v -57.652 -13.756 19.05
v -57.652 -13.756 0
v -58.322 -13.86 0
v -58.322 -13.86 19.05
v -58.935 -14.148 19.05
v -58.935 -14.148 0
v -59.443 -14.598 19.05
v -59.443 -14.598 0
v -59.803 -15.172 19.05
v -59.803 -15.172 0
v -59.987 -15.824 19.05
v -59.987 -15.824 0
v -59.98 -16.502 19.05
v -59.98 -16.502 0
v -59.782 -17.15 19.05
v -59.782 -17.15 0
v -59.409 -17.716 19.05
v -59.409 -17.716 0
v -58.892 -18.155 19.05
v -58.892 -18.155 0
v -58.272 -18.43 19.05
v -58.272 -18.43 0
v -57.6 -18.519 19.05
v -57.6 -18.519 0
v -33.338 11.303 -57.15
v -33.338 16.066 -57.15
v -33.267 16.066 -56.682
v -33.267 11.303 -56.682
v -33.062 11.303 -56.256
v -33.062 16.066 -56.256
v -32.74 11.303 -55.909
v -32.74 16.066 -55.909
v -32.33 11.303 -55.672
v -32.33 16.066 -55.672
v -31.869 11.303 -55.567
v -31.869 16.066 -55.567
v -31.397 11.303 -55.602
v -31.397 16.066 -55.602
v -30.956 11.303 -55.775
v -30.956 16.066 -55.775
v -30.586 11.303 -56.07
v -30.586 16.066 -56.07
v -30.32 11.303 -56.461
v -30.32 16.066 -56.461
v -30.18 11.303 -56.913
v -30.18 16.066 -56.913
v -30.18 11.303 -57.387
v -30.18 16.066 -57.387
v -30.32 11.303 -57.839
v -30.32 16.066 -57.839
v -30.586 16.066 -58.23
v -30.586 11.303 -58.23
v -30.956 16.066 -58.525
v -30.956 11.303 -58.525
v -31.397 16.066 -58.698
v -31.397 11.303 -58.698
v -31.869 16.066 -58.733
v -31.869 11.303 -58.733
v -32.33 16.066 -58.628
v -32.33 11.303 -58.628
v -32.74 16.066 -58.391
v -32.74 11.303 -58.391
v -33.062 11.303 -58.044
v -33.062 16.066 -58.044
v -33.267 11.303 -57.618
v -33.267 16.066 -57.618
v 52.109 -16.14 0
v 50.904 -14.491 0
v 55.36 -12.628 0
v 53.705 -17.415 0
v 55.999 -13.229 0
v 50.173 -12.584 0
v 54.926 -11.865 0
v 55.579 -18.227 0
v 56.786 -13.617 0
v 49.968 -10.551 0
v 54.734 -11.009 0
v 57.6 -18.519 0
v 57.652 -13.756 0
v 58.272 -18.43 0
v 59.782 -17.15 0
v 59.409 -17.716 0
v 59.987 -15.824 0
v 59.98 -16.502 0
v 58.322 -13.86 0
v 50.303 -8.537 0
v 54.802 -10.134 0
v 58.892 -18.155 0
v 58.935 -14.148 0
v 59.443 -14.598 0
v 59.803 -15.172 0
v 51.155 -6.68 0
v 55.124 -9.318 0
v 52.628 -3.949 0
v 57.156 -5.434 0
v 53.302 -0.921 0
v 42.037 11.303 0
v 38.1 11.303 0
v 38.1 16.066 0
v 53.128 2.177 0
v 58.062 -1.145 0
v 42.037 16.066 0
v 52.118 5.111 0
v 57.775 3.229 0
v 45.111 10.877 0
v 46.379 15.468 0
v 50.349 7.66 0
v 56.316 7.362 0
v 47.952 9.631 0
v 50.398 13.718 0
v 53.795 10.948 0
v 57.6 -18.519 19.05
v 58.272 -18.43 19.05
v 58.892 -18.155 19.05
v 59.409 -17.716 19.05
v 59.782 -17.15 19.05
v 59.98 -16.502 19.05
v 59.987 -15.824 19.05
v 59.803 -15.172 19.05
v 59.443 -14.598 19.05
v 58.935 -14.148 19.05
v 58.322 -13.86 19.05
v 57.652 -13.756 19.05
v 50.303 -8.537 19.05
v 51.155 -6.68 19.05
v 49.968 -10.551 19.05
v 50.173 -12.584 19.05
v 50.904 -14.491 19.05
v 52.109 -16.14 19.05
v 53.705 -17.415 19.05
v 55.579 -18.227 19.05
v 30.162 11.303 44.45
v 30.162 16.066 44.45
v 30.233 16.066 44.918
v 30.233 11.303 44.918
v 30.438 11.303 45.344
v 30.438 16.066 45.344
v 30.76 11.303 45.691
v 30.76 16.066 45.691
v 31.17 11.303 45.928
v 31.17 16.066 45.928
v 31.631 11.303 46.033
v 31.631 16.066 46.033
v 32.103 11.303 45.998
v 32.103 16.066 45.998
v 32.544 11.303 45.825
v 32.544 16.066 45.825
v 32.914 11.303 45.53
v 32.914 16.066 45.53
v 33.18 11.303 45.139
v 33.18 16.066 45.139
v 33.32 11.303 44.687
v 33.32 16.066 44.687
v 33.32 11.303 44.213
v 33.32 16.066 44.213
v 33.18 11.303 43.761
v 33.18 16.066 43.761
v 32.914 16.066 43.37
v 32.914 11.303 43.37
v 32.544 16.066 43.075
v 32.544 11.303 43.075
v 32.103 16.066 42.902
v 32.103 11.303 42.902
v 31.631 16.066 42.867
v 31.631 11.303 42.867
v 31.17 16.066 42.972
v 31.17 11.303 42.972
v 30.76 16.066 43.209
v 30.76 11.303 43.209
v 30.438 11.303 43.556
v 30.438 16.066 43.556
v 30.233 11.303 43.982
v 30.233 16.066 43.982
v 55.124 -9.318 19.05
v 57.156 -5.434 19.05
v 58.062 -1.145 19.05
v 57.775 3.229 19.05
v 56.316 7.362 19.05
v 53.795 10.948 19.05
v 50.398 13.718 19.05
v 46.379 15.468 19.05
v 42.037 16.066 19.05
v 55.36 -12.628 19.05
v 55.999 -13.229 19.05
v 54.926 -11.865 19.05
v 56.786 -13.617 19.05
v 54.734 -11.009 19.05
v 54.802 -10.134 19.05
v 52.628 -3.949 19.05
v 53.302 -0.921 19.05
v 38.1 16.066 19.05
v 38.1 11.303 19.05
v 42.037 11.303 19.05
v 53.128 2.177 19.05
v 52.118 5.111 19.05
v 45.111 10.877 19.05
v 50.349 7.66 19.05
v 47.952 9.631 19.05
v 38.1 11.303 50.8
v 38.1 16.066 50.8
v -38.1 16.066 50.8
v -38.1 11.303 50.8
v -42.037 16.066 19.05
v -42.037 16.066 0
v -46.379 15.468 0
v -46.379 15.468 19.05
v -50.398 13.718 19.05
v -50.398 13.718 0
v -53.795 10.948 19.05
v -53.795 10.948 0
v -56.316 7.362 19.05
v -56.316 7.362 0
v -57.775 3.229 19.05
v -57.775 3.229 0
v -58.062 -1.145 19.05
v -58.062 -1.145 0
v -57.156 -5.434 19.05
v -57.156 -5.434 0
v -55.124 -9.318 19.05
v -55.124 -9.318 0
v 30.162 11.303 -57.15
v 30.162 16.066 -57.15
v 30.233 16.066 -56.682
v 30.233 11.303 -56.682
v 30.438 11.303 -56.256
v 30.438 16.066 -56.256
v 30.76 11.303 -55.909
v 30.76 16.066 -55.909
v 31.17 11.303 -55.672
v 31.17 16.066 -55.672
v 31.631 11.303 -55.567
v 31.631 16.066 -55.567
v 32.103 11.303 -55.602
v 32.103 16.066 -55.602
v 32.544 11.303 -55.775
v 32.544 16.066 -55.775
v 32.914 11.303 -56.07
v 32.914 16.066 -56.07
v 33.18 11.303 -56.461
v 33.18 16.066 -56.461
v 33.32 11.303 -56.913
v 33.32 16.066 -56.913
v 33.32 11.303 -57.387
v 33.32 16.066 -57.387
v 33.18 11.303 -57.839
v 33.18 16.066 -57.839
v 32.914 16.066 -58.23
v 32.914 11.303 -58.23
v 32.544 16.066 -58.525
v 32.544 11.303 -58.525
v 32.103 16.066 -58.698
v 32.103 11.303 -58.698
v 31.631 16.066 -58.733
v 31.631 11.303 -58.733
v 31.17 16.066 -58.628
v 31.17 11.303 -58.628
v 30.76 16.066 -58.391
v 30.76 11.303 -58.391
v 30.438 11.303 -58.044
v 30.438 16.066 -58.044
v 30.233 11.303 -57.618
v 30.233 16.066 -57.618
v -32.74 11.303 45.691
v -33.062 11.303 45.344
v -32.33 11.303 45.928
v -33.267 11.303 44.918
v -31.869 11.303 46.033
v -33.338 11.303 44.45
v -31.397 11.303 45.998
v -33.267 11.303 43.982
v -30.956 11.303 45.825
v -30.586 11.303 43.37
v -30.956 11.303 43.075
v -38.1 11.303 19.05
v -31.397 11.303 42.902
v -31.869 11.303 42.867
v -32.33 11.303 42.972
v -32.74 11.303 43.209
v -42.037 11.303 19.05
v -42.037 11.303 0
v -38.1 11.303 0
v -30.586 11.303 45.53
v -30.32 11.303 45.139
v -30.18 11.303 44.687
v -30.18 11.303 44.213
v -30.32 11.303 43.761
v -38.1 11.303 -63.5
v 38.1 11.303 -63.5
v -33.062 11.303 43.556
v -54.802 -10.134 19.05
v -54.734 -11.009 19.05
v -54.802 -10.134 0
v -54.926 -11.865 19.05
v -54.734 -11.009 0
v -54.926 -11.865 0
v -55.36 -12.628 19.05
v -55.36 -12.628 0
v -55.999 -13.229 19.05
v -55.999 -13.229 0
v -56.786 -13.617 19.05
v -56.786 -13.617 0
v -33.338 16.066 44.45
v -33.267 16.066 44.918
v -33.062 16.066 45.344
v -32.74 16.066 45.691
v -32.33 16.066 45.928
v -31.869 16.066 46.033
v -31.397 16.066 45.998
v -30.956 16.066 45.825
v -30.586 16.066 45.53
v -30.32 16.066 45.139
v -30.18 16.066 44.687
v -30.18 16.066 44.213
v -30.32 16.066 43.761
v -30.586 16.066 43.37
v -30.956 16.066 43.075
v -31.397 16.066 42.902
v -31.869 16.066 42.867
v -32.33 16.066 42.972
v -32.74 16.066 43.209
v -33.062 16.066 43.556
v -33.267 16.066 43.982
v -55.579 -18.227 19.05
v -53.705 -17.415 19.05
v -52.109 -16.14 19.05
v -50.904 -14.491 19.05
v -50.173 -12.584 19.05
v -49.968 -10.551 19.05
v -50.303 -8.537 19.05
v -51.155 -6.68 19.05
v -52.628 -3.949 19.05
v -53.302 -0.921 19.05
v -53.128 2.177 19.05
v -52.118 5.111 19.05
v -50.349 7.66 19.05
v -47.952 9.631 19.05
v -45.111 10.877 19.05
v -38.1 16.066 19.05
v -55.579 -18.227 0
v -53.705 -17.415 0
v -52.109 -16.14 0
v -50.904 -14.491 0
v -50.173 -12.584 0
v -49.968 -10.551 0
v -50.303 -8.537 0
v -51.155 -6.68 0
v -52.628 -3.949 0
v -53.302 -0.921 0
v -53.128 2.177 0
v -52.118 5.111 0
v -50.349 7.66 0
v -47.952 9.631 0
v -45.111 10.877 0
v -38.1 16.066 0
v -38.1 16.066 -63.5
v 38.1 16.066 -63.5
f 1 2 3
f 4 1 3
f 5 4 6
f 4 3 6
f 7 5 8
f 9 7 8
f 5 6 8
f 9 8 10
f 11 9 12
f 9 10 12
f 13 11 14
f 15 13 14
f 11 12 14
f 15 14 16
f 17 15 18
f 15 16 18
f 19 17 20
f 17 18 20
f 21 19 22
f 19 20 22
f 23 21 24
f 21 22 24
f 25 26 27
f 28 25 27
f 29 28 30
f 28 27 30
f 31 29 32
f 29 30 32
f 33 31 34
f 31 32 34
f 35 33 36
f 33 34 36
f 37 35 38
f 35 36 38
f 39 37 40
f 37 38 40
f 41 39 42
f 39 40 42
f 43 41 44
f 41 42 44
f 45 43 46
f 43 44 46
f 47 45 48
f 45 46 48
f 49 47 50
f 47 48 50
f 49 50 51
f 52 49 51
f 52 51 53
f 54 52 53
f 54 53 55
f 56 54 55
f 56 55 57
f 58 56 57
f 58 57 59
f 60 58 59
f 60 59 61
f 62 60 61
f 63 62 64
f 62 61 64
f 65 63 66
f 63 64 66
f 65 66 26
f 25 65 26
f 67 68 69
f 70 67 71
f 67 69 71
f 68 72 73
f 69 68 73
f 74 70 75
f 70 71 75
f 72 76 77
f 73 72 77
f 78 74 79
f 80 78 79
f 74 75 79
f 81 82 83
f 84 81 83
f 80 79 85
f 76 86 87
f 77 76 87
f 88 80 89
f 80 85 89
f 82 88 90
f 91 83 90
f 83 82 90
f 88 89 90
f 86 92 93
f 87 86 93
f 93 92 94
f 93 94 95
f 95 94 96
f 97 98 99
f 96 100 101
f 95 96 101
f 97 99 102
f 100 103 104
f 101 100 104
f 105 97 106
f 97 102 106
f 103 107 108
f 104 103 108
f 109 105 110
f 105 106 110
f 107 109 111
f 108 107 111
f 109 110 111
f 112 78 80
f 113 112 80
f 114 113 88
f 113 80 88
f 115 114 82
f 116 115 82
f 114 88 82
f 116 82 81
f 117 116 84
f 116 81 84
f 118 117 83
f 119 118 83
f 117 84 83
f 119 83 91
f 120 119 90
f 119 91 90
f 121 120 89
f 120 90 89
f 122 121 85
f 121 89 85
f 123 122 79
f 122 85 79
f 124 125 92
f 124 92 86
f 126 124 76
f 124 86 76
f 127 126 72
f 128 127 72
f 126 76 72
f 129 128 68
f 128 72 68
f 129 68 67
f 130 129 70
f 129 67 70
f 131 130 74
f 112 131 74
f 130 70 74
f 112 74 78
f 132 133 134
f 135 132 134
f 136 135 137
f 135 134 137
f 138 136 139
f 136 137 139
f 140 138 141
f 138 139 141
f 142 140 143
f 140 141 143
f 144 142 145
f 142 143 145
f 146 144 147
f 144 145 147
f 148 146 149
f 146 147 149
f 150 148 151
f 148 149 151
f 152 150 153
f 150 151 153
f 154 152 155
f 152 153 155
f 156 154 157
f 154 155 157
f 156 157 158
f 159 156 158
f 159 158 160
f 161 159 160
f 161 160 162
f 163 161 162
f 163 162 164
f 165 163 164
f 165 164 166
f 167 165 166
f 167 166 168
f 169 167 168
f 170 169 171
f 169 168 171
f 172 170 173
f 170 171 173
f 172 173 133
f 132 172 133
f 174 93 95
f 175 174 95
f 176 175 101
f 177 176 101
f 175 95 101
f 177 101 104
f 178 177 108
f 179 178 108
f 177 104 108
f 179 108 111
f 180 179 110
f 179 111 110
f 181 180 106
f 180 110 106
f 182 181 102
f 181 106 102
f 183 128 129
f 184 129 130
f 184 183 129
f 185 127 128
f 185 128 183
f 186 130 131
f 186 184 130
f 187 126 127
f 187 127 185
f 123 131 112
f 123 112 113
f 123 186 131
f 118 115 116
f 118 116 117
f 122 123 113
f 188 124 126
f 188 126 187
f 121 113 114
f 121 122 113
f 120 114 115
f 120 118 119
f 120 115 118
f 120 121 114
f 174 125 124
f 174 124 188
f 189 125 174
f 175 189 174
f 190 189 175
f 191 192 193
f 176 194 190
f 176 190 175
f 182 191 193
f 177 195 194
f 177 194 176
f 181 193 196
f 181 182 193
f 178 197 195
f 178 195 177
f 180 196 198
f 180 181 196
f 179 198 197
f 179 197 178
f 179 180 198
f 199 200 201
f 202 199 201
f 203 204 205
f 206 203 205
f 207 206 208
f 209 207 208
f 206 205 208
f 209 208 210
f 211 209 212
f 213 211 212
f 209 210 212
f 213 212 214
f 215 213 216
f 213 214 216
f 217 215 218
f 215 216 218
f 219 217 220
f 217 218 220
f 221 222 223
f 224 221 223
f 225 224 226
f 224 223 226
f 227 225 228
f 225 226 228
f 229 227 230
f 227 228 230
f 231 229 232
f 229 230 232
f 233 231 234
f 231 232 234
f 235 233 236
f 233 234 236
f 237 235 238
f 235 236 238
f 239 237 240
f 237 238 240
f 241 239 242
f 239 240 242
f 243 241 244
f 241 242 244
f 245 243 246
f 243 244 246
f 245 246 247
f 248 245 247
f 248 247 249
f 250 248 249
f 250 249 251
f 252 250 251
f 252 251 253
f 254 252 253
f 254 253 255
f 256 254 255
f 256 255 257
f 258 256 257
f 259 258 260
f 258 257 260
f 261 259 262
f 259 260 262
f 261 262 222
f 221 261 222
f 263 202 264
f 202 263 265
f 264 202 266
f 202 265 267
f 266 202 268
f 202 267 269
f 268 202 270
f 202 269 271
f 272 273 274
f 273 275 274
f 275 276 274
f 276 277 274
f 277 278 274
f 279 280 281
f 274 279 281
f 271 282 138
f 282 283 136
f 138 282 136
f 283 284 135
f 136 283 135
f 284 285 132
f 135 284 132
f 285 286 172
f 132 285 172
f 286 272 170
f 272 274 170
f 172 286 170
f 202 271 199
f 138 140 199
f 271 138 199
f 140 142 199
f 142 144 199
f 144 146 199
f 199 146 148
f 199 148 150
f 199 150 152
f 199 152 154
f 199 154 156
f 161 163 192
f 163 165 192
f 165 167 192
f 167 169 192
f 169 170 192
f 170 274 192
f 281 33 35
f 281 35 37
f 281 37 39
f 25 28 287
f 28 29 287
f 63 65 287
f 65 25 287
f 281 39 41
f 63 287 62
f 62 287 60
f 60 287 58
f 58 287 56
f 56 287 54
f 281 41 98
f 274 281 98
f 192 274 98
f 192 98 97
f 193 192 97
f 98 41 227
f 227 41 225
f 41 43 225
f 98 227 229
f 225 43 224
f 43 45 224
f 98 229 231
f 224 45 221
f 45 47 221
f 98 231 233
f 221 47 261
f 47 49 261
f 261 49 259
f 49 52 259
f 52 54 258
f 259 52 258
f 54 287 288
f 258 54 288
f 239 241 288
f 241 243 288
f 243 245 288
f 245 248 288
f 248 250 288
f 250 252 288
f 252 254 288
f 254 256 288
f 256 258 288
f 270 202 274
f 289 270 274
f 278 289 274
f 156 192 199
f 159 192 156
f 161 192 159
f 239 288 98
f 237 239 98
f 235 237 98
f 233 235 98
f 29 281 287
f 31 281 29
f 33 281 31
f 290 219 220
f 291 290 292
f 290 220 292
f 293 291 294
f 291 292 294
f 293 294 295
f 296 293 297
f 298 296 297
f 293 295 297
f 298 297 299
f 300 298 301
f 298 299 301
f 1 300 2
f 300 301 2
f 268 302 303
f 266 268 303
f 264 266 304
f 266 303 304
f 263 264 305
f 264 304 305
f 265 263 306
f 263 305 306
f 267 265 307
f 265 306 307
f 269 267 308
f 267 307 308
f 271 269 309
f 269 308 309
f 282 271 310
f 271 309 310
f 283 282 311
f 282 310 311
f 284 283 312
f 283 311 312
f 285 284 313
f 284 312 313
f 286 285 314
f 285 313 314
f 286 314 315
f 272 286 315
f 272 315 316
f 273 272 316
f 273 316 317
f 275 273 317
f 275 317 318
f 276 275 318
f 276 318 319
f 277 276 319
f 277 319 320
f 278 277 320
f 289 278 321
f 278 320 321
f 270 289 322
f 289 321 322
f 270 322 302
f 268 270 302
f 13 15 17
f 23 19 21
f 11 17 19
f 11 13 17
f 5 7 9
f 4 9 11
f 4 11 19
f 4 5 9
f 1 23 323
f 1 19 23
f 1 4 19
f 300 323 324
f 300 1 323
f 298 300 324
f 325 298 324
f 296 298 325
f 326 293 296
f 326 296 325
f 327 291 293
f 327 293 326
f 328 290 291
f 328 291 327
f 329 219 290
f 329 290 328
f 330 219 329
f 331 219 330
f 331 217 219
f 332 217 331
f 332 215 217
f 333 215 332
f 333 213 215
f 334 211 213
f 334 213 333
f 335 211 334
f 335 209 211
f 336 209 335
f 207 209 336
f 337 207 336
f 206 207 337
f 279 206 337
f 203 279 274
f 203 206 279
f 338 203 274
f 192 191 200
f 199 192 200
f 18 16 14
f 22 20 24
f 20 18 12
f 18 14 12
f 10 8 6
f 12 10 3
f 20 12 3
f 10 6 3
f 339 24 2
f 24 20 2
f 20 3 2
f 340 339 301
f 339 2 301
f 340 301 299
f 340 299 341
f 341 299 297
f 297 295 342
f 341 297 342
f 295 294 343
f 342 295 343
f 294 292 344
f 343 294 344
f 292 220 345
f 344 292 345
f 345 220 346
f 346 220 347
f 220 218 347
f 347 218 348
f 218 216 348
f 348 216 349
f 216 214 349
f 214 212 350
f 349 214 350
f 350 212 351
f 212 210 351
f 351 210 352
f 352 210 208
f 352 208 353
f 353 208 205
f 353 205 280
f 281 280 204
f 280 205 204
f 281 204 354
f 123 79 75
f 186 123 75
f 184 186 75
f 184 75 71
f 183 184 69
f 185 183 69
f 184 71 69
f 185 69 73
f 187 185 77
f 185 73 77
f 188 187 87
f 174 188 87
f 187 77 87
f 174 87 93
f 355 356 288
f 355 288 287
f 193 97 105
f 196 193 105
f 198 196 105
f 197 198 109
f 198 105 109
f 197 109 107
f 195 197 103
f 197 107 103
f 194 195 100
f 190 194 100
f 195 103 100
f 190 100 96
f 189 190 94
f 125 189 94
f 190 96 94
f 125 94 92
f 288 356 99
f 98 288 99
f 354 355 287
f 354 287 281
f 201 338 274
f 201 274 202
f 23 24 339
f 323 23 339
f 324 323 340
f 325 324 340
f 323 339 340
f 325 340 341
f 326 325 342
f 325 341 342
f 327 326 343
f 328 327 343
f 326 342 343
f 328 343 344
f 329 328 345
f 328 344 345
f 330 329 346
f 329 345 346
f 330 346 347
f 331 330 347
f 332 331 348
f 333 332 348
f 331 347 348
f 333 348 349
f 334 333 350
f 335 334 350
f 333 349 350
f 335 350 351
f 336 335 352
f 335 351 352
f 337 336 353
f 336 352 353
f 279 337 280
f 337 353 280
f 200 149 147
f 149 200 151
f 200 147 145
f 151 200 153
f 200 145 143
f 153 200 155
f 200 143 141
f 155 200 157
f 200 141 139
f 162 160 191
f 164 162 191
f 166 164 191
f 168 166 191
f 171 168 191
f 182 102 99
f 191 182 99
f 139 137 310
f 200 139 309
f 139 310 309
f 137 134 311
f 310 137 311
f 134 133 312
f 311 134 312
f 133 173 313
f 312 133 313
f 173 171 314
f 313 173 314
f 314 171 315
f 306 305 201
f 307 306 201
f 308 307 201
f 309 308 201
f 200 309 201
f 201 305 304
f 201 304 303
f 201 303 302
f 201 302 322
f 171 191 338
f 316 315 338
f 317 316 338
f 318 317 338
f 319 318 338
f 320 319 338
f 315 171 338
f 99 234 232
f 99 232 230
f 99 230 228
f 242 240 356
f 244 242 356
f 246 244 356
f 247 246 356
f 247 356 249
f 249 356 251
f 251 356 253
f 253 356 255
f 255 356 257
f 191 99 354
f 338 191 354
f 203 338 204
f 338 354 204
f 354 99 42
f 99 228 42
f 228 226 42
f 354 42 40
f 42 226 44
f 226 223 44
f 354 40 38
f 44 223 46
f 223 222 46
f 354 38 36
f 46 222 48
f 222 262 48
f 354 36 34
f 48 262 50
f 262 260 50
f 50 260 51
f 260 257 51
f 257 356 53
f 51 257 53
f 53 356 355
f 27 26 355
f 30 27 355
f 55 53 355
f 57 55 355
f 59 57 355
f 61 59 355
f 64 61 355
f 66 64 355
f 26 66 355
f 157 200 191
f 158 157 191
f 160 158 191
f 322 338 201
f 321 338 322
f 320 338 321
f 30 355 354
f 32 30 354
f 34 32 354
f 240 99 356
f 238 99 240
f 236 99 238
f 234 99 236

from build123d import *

# Parameters (mm, degrees)
F1_DEPTH = 19.05
F2_W     = 76.2
F2_H     = 31.75
F2_H_2   = 63.5
F3_DEPTH = 4.7625
F4_R     = 1.5875
F5_DEPTH = 4.7625


with BuildPart() as f1:
    # F0 (on Top) → F1 (new body)
    with BuildSketch(Plane.XY):
        with BuildLine():
            ThreePointArc((42.037, 11.303), (52.118297, 5.111287), (51.154651, -6.680288))
            ThreePointArc((51.154651, -6.680288), (50.904065, -14.490744), (57.600453, -18.518697))
            ThreePointArc((57.600453, -18.518697), (60.007424, -16.163448), (57.652175, -13.756478))
            ThreePointArc((57.652175, -13.756478), (55.11432, -12.262843), (55.124148, -9.318092))
            ThreePointArc((55.124148, -9.318092), (56.316357, 7.362081), (42.037, 16.0655))
            Line((42.037, 16.0655), (0, 16.0655))
            Line((0, 16.0655), (-42.037, 16.0655))
            ThreePointArc((-42.037, 16.0655), (-56.316357, 7.362081), (-55.124148, -9.318092))
            ThreePointArc((-55.124148, -9.318092), (-55.11432, -12.262843), (-57.652175, -13.756478))
            ThreePointArc((-57.652175, -13.756478), (-60.007424, -16.163448), (-57.600453, -18.518697))
            ThreePointArc((-57.600453, -18.518697), (-50.904065, -14.490744), (-51.154651, -6.680288))
            ThreePointArc((-51.154651, -6.680288), (-52.118297, 5.111287), (-42.037, 11.303))
            Line((-42.037, 11.303), (0, 11.303))
            Line((0, 11.303), (42.037, 11.303))
        make_face()
    extrude(amount=F1_DEPTH)

    # F2 (on face) → F3 (join)
    with BuildSketch(Plane(origin=(0, 16.0655, 0), x_dir=(-1, 0, 0), z_dir=(0, 1, 0))):
        with Locations((0, 34.925)):
            Rectangle(F2_W, F2_H)
        with Locations((0, -31.75)):
            Rectangle(F2_W, F2_H_2)
    extrude(amount=-F3_DEPTH)

    # F4 (on face) → F5 (cut)
    with BuildSketch(Plane(origin=(0, 16.0655, 0), x_dir=(-1, 0, 0), z_dir=(0, 1, 0))):
        with Locations((-31.75, 44.45)):
            Circle(F4_R)
        with Locations((31.75, 44.45)):
            Circle(F4_R)
        with Locations((31.75, -57.15)):
            Circle(F4_R)
        with Locations((-31.75, -57.15)):
            Circle(F4_R)
    extrude(amount=-F5_DEPTH, mode=Mode.SUBTRACT)


solid = f1.part
